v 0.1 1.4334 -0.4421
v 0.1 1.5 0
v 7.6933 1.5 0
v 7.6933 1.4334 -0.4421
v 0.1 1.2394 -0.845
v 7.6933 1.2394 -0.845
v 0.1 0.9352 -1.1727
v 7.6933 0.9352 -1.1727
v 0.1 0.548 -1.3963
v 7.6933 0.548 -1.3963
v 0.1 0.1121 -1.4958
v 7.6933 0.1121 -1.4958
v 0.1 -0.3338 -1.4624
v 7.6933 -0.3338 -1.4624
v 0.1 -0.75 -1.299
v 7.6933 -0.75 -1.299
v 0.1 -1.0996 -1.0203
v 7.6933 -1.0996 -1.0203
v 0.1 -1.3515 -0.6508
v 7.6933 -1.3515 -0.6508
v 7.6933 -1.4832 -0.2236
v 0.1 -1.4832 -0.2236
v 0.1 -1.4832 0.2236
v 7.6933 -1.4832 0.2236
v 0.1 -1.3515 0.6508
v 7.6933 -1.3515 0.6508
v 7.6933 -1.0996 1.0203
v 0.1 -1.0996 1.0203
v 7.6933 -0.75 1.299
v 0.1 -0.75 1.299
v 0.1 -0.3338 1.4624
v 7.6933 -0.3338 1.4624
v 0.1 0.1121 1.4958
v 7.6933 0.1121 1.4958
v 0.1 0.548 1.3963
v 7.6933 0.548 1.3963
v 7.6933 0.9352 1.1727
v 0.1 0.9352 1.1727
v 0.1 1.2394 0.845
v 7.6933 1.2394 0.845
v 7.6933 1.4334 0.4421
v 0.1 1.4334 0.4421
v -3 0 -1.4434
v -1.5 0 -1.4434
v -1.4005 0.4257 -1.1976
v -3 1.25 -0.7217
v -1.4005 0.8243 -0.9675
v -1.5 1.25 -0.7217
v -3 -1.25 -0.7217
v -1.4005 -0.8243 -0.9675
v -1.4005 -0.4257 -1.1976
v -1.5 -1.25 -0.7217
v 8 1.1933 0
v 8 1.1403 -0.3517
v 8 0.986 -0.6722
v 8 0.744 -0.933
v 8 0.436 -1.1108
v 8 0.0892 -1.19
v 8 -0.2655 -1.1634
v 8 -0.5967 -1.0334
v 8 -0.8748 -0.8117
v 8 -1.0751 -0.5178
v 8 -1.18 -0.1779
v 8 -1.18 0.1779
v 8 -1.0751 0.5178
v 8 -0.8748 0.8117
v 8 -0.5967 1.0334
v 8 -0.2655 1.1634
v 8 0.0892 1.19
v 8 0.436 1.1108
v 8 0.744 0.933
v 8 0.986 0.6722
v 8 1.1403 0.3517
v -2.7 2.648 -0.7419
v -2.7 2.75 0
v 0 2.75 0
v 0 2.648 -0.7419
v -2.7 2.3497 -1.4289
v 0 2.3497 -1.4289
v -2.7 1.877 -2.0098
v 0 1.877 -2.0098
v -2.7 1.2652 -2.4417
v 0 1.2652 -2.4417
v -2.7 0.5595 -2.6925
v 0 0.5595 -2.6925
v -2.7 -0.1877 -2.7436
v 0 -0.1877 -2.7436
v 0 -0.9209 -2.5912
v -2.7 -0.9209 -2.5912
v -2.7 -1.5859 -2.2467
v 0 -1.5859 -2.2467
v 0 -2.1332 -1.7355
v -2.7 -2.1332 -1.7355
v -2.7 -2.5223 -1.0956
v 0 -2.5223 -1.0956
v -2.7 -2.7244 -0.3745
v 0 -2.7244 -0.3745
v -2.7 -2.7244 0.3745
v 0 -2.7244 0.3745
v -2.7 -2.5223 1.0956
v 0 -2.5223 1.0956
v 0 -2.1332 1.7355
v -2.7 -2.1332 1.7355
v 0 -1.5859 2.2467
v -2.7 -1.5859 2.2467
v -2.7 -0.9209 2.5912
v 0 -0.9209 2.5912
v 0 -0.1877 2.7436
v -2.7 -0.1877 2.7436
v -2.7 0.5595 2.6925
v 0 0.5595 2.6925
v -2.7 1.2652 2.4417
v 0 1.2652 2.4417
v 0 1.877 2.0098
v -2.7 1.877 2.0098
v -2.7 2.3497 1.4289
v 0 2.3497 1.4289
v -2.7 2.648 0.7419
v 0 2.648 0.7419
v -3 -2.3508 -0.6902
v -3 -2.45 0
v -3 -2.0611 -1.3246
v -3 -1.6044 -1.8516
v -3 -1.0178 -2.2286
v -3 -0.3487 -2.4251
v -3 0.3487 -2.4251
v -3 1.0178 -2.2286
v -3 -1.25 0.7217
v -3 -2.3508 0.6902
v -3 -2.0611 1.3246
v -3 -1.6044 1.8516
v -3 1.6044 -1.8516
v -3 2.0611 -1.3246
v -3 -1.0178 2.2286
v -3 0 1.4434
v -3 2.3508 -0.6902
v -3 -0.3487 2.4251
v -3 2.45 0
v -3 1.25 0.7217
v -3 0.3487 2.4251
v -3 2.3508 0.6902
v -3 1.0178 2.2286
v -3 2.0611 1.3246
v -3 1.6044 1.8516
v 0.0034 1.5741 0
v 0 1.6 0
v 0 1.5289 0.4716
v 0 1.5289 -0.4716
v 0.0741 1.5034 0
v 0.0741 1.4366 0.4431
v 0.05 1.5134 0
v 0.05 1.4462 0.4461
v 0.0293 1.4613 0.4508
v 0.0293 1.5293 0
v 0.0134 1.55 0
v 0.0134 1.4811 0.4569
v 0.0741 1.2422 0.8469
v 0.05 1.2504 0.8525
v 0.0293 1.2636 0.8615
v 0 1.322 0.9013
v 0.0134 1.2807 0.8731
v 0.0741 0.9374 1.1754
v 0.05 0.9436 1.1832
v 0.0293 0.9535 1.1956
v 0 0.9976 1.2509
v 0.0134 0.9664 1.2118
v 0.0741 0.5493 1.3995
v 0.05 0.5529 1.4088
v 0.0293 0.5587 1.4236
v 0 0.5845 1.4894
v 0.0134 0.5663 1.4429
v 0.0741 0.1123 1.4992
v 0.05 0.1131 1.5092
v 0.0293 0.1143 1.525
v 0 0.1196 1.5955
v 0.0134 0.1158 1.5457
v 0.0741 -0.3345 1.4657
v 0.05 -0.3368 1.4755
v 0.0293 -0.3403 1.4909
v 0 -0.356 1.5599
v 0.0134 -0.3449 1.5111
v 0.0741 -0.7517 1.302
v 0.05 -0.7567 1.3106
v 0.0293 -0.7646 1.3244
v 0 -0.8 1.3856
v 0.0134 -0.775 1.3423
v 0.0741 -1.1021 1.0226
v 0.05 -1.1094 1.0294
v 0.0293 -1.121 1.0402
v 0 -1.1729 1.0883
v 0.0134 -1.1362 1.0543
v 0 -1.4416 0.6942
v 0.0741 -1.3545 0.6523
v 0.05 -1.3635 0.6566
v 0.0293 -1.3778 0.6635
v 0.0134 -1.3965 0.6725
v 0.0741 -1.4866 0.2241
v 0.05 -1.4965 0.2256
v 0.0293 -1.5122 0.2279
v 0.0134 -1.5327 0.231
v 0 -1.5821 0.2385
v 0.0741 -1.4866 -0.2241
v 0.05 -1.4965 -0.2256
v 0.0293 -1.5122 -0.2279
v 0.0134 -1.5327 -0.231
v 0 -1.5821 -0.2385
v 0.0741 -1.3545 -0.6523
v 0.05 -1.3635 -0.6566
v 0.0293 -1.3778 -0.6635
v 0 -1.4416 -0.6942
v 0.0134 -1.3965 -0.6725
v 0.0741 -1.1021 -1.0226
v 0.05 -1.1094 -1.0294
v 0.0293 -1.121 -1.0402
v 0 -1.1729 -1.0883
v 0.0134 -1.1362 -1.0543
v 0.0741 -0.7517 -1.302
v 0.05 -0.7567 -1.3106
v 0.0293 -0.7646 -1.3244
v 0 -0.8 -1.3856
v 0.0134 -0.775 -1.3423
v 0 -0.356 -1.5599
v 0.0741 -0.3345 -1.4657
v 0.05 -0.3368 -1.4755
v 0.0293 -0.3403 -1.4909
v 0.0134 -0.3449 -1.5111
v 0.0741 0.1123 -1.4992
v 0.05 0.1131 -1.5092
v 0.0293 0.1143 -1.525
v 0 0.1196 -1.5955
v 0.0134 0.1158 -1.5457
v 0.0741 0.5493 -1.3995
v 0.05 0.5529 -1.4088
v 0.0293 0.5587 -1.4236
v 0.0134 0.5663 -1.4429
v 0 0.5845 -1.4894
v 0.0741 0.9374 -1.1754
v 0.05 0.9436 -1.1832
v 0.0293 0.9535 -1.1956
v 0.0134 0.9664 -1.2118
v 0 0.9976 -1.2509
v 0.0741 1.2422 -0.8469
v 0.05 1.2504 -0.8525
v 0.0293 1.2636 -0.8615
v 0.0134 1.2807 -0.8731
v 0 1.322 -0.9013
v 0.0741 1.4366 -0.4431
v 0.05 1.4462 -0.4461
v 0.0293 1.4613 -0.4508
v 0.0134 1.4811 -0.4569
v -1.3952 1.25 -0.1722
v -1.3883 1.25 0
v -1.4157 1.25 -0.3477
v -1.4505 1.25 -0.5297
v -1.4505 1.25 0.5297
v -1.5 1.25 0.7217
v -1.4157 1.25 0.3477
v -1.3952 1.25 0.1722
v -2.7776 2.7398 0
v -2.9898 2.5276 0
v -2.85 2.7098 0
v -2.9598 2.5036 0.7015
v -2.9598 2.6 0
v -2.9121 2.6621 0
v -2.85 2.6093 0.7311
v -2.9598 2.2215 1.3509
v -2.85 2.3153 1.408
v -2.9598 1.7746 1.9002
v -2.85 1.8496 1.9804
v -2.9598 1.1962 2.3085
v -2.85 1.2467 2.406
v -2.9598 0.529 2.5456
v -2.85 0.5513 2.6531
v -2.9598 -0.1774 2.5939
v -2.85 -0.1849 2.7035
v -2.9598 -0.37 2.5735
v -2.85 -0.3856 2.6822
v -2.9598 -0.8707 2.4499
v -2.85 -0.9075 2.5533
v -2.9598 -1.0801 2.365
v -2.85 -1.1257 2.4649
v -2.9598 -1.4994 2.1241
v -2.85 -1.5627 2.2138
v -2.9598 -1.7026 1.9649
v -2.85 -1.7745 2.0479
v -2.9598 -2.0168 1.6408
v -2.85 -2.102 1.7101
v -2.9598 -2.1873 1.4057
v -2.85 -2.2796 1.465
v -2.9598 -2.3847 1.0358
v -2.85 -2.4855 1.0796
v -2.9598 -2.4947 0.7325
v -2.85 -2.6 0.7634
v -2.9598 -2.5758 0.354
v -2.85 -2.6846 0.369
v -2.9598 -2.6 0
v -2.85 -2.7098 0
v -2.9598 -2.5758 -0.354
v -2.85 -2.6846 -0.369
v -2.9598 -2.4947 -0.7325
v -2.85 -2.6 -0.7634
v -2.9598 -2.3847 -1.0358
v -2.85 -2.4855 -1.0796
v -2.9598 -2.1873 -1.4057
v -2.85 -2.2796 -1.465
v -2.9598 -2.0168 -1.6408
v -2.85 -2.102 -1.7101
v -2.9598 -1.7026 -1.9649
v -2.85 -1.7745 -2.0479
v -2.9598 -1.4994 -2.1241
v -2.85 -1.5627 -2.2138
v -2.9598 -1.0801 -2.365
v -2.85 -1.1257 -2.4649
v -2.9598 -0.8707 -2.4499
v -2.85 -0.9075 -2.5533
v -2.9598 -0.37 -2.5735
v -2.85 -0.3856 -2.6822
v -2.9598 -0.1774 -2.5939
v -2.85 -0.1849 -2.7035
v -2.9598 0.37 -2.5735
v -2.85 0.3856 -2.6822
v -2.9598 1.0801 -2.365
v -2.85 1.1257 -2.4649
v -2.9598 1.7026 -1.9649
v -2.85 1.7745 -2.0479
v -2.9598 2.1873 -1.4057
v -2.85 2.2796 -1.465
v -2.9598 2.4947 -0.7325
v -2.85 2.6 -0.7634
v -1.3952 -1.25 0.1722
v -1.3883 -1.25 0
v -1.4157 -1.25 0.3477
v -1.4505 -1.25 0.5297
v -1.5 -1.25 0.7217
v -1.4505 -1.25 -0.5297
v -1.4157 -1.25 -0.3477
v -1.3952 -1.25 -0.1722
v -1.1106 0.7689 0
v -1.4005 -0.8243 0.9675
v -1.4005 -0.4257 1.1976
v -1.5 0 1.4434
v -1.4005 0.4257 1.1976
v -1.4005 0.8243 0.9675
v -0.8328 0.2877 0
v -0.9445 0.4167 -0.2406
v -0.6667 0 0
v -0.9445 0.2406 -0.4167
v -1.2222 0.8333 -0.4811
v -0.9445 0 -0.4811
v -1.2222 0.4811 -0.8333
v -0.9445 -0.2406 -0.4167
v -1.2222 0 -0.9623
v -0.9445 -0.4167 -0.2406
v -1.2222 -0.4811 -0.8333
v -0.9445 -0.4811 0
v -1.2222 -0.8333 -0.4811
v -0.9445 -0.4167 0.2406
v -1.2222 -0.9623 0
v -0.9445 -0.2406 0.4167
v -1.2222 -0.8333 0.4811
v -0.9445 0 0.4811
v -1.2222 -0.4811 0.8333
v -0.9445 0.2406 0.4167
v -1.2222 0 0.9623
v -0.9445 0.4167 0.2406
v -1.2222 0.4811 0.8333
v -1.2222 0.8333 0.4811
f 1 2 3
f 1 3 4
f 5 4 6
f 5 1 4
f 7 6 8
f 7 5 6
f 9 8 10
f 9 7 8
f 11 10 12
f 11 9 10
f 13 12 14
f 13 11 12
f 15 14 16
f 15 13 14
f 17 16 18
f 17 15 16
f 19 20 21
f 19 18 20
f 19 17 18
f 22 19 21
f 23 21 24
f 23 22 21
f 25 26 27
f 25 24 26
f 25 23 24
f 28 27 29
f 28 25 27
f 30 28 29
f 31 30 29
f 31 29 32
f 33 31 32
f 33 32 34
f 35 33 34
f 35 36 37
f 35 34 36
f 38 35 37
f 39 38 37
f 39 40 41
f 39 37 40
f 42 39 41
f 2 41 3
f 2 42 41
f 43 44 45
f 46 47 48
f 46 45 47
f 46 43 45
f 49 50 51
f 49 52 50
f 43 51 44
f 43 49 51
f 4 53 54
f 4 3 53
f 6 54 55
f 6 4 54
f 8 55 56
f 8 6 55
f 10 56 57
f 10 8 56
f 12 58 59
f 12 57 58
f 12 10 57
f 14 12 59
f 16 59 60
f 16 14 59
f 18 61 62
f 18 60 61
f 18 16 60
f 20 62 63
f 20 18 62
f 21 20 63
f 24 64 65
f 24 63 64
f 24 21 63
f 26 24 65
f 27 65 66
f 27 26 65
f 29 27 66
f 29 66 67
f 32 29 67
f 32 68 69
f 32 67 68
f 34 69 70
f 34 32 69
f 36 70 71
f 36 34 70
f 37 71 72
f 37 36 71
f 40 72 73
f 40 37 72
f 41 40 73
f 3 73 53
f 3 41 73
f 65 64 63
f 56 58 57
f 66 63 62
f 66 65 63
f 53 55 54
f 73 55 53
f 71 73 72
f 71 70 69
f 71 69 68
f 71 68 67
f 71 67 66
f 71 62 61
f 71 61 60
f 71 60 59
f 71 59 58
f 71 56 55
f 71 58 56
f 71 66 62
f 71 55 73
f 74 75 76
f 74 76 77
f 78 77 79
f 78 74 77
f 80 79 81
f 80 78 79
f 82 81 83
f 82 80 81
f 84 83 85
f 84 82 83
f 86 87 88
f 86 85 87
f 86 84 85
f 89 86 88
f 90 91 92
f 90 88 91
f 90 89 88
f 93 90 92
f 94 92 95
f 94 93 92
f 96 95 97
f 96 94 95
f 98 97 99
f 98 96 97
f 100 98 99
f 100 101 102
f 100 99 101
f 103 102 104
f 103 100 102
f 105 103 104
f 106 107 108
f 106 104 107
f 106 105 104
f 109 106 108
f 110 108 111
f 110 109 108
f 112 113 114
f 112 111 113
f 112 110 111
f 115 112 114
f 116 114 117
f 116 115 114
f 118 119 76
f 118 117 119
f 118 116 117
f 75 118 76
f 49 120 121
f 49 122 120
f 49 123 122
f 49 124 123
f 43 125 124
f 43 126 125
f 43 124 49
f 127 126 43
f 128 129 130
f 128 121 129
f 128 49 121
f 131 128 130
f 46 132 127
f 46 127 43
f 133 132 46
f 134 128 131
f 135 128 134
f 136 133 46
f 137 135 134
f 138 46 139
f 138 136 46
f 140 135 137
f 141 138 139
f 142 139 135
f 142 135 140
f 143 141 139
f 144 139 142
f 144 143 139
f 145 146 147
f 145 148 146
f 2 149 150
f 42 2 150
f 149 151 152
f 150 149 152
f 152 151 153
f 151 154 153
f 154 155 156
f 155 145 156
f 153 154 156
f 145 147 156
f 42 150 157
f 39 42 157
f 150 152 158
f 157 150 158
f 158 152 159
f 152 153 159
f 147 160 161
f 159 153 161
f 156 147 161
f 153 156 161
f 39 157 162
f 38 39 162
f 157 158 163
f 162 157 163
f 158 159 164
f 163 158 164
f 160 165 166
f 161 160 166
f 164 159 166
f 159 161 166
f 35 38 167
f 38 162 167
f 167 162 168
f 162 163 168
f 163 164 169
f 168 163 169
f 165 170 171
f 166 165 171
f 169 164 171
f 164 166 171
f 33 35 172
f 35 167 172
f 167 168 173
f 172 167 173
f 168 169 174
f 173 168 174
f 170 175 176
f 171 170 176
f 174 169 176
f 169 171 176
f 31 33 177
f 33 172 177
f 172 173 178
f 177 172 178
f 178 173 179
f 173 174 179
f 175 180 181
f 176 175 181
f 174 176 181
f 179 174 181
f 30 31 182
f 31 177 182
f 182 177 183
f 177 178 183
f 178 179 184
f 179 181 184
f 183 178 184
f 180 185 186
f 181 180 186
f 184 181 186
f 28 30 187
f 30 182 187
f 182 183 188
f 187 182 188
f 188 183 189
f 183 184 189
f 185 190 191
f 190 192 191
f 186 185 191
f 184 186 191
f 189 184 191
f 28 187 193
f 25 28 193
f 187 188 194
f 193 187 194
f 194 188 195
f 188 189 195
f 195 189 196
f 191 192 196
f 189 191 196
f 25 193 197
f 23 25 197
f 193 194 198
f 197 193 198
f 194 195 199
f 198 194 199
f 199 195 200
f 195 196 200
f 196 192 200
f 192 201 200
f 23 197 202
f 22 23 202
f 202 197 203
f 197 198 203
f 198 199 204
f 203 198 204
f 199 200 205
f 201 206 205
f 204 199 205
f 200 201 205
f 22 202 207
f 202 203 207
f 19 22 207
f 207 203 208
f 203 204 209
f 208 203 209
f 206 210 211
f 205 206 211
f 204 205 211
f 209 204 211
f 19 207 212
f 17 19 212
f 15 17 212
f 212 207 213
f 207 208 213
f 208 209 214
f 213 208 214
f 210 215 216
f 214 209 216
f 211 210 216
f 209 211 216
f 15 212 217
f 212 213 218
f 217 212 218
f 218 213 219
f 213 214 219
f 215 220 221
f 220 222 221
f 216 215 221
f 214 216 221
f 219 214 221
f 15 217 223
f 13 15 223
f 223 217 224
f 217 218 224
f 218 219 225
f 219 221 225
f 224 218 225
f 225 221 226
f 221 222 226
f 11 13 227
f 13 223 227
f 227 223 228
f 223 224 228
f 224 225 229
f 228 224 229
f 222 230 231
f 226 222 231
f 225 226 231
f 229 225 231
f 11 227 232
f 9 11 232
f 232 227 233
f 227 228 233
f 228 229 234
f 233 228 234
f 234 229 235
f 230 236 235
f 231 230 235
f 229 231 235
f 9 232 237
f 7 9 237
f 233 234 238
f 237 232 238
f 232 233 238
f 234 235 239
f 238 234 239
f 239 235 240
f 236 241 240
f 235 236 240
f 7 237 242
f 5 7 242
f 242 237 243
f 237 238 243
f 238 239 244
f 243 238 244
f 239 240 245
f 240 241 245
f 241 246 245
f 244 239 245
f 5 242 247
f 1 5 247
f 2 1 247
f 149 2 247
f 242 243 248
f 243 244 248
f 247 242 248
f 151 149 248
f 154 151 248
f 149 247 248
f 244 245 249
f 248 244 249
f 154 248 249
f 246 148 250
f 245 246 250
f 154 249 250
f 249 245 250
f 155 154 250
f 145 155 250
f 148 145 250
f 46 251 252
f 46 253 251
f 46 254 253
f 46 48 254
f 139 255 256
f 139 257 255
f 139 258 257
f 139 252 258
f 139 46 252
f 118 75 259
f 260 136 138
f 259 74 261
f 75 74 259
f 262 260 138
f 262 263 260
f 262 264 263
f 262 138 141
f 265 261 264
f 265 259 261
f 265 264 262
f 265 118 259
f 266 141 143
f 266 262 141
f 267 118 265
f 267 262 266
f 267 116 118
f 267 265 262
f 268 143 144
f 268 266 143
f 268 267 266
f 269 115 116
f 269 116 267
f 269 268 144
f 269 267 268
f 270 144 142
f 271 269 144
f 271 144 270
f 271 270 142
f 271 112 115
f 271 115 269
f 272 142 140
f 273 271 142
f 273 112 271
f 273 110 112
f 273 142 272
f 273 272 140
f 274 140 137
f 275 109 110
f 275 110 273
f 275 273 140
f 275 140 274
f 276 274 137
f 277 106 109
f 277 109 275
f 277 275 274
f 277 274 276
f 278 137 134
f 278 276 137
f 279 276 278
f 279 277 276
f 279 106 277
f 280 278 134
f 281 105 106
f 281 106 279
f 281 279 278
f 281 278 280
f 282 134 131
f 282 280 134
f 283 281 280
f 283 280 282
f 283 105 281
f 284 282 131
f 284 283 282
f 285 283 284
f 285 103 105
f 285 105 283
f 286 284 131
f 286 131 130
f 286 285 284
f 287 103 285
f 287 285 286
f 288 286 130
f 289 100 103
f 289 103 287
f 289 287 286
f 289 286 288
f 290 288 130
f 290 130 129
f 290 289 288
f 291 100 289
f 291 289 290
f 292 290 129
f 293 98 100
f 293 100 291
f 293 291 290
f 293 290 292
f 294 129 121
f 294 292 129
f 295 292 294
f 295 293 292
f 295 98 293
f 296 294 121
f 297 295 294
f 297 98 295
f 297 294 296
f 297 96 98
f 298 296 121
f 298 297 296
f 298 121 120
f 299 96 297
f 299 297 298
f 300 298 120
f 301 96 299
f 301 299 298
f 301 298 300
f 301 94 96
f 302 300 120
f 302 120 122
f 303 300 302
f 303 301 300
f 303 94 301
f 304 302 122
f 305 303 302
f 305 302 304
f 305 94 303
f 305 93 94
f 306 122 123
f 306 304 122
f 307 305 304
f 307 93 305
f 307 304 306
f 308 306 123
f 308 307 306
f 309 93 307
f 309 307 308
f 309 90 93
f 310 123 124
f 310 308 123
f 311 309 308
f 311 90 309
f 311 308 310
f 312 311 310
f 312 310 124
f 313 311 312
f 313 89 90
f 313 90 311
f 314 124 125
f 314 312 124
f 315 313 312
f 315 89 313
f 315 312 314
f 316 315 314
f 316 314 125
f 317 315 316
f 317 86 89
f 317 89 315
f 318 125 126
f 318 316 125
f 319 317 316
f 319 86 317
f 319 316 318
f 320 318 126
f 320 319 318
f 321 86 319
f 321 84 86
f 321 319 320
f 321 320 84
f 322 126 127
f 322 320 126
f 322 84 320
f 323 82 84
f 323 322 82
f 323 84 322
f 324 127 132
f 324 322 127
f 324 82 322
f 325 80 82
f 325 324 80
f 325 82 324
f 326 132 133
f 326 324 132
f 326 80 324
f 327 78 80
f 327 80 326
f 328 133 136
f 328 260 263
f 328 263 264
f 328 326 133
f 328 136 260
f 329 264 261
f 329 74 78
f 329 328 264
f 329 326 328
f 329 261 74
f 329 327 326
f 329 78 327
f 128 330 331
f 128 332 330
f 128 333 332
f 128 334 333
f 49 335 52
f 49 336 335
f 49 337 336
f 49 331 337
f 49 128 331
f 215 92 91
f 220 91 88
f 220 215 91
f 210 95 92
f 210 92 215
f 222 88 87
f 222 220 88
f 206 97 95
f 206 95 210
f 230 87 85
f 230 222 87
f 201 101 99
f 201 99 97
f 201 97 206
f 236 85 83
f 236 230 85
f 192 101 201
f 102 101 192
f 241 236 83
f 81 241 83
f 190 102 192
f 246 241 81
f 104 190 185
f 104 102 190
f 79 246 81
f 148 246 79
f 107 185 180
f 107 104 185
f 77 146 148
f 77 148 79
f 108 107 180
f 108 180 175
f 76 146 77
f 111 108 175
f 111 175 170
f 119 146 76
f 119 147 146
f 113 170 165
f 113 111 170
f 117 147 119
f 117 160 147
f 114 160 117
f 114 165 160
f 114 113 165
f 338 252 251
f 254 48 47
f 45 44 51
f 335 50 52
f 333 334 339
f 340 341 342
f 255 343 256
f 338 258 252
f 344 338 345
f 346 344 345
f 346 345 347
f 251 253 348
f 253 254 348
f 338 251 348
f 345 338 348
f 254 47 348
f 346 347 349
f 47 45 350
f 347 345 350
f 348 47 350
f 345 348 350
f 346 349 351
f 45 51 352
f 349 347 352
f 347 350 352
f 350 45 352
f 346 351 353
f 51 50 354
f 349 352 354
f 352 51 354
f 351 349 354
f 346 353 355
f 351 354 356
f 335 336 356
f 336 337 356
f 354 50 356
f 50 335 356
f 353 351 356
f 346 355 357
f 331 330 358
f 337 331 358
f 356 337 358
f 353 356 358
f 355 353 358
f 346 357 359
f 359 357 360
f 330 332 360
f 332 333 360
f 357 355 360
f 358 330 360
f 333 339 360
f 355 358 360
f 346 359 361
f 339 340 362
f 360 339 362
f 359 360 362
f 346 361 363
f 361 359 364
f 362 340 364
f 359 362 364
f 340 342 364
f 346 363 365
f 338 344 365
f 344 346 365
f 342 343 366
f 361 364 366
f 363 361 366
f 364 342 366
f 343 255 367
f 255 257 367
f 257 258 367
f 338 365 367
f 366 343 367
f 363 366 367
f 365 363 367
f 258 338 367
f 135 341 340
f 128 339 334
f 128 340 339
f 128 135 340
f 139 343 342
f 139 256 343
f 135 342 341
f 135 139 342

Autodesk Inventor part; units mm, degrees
ref_plane "YZ Plane" through (0, 0, 0) normal (1, 0, 0) x (0, 1, 0)
ref_plane "XZ Plane" through (0, 0, 0) normal (0, 1, 0) x (-1, 0, 0)
sketch "Sketch1" plane through (0, 0, 0) normal (0, 0, 1) x (1, 0, 0)
  line L0 (-0.6667, 0) -> (8, 0)
  line L1 (8, 0) -> (8, 1.5)
  line L2 (8, 1.5) -> (1.3067, 1.5)
  line L3 (1.3067, 1.5) -> (1, 1.5)
  line L4 (1, 1.5) -> (0, 1.5)
  line L5 (0, 1.5) -> (0, 2.75)
  line L6 (0, 2.75) -> (-3, 2.75)
  line L7 (-3, 2.75) -> (-3, 1.4434)
  line L8 (-3, 1.4434) -> (-1.5, 1.4434)
  line L9 (-1.5, 1.4434) -> (-0.6667, 0)
  line L10 (-5.2, 0) -> (10.2, 0) projected
  line L11 (0, -0.55) -> (0, 3.3) projected
  line L12 (1.3067, 1.5) -> (0, 1.5) construction
  dimension "d0" = 6.6933
  dimension "d1" = 0.3067
  dimension "d2" = 3
  dimension "d3" = 1.5
  dimension "d4" = 60
  dimension "d5" = 3
  dimension "d6" = 3
  dimension "d7" = 2.8868
  dimension "d8" = 5.5
  dimension "d19" = 8
revolve "Body" add sketch "Sketch1" angle 360 about axis through (-0.6667, 0, 0) along (1, 0, 0)
sketch "Sketch2" plane through (-3, 0, 0) normal (-1, 0, 0) x (0, 0, 1)
  circle A0 centre (0, 0) radius 1.4434 projected
  line L0 (0, -3.85) -> (0, 3.85) projected
  line L1 (-3.85, 0) -> (3.85, 0) projected
  line L2 (1.4434, 0) -> (0.7217, -1.25)
  line L3 (0.7217, -1.25) -> (-0.7217, -1.25)
  line L4 (-0.7217, -1.25) -> (-1.4434, 0)
  line L5 (-1.4434, 0) -> (-0.7217, 1.25)
  line L6 (-0.7217, 1.25) -> (0.7217, 1.25)
  line L7 (0.7217, 1.25) -> (1.4434, 0)
extrude "Slot" add sketch "Sketch2" against normal up to next contours L7 A0 | A0 L2 | L6 L0 A0 | A0 L0 L3 | L0 L6 A0 | A0 L3 L0 | L4 A0 | A0 L5
fillet "Fillet2" radius 0.3 1 edges at (-3, -2.75, 0)
thread "Thread" size "M3x0.5" class "6g" standard "ISO Metric profile" length 6.6933
chamfer "Chamfer1" distance 0.3067 distance2 0.3067 1 edges at (8, -1.5, 0) measured on face at (8, 0.5539, 0.4443)
fillet "Fillet1" radius 0.1 1 edges at (0, -1.5, 0)
ref_plane "Work Plane1" through (30, 0, 0) normal (0, -0.5, 0.866) x (1, 0, 0)
equation "\"d0\" = GEL"
equation "\"d1\" = GAL"
equation "\"d2\" = KOH"
equation "\"d3\" = INTI"
equation "\"d5\" = GD"
equation "\"d6\" = BDM"
equation "\"d7\" = 1.1547 * SW"
equation "\"d8\" = KOD"
equation "\"d19\" = NLG"
equation "\"d16\" = RR"
equation "\"d12\" = GEL"
equation "\"d14\" = -0.5 * SPD + 0.5 * GD"
equation "\"d15\" = GUL"
equation "\"d29\" = R"
equation "\"GD\" = NND"
equation "\"NLG\" = 8"
equation "\"GEL\" = 6.69328"
equation "\"KOD\" = 5.5"
equation "\"KOH\" = 3"
equation "\"INTI\" = 1.5"
equation "\"GAL\" = 0.61345 * PTC"
equation "\"GUL\" = 0.61345 * PTC"
equation "\"BDM\" = NND"
equation "\"SW\" = 2.5"
equation "\"RR\" = 0.3"
equation "\"SPD\" = 2.38655"
equation "\"d28\" = R"
equation "\"R\" = 0.1"
equation "\"TOA\" = 30deg"
equation "\"THREADDIA\" = 3"
equation "\"KOD1\" = KOD"
equation "\"PTC\" = 0.5"
equation "\"NND\" = 3"
equation "\"E0\" = 1.155 * SW"
equation "\"GD1\" = THREADDIA - 1.2269 * PTC"
properties part number "ANSI B18.3.1M - M3x0.5 x 8, BSHCSM" material "Steel, Mild"
